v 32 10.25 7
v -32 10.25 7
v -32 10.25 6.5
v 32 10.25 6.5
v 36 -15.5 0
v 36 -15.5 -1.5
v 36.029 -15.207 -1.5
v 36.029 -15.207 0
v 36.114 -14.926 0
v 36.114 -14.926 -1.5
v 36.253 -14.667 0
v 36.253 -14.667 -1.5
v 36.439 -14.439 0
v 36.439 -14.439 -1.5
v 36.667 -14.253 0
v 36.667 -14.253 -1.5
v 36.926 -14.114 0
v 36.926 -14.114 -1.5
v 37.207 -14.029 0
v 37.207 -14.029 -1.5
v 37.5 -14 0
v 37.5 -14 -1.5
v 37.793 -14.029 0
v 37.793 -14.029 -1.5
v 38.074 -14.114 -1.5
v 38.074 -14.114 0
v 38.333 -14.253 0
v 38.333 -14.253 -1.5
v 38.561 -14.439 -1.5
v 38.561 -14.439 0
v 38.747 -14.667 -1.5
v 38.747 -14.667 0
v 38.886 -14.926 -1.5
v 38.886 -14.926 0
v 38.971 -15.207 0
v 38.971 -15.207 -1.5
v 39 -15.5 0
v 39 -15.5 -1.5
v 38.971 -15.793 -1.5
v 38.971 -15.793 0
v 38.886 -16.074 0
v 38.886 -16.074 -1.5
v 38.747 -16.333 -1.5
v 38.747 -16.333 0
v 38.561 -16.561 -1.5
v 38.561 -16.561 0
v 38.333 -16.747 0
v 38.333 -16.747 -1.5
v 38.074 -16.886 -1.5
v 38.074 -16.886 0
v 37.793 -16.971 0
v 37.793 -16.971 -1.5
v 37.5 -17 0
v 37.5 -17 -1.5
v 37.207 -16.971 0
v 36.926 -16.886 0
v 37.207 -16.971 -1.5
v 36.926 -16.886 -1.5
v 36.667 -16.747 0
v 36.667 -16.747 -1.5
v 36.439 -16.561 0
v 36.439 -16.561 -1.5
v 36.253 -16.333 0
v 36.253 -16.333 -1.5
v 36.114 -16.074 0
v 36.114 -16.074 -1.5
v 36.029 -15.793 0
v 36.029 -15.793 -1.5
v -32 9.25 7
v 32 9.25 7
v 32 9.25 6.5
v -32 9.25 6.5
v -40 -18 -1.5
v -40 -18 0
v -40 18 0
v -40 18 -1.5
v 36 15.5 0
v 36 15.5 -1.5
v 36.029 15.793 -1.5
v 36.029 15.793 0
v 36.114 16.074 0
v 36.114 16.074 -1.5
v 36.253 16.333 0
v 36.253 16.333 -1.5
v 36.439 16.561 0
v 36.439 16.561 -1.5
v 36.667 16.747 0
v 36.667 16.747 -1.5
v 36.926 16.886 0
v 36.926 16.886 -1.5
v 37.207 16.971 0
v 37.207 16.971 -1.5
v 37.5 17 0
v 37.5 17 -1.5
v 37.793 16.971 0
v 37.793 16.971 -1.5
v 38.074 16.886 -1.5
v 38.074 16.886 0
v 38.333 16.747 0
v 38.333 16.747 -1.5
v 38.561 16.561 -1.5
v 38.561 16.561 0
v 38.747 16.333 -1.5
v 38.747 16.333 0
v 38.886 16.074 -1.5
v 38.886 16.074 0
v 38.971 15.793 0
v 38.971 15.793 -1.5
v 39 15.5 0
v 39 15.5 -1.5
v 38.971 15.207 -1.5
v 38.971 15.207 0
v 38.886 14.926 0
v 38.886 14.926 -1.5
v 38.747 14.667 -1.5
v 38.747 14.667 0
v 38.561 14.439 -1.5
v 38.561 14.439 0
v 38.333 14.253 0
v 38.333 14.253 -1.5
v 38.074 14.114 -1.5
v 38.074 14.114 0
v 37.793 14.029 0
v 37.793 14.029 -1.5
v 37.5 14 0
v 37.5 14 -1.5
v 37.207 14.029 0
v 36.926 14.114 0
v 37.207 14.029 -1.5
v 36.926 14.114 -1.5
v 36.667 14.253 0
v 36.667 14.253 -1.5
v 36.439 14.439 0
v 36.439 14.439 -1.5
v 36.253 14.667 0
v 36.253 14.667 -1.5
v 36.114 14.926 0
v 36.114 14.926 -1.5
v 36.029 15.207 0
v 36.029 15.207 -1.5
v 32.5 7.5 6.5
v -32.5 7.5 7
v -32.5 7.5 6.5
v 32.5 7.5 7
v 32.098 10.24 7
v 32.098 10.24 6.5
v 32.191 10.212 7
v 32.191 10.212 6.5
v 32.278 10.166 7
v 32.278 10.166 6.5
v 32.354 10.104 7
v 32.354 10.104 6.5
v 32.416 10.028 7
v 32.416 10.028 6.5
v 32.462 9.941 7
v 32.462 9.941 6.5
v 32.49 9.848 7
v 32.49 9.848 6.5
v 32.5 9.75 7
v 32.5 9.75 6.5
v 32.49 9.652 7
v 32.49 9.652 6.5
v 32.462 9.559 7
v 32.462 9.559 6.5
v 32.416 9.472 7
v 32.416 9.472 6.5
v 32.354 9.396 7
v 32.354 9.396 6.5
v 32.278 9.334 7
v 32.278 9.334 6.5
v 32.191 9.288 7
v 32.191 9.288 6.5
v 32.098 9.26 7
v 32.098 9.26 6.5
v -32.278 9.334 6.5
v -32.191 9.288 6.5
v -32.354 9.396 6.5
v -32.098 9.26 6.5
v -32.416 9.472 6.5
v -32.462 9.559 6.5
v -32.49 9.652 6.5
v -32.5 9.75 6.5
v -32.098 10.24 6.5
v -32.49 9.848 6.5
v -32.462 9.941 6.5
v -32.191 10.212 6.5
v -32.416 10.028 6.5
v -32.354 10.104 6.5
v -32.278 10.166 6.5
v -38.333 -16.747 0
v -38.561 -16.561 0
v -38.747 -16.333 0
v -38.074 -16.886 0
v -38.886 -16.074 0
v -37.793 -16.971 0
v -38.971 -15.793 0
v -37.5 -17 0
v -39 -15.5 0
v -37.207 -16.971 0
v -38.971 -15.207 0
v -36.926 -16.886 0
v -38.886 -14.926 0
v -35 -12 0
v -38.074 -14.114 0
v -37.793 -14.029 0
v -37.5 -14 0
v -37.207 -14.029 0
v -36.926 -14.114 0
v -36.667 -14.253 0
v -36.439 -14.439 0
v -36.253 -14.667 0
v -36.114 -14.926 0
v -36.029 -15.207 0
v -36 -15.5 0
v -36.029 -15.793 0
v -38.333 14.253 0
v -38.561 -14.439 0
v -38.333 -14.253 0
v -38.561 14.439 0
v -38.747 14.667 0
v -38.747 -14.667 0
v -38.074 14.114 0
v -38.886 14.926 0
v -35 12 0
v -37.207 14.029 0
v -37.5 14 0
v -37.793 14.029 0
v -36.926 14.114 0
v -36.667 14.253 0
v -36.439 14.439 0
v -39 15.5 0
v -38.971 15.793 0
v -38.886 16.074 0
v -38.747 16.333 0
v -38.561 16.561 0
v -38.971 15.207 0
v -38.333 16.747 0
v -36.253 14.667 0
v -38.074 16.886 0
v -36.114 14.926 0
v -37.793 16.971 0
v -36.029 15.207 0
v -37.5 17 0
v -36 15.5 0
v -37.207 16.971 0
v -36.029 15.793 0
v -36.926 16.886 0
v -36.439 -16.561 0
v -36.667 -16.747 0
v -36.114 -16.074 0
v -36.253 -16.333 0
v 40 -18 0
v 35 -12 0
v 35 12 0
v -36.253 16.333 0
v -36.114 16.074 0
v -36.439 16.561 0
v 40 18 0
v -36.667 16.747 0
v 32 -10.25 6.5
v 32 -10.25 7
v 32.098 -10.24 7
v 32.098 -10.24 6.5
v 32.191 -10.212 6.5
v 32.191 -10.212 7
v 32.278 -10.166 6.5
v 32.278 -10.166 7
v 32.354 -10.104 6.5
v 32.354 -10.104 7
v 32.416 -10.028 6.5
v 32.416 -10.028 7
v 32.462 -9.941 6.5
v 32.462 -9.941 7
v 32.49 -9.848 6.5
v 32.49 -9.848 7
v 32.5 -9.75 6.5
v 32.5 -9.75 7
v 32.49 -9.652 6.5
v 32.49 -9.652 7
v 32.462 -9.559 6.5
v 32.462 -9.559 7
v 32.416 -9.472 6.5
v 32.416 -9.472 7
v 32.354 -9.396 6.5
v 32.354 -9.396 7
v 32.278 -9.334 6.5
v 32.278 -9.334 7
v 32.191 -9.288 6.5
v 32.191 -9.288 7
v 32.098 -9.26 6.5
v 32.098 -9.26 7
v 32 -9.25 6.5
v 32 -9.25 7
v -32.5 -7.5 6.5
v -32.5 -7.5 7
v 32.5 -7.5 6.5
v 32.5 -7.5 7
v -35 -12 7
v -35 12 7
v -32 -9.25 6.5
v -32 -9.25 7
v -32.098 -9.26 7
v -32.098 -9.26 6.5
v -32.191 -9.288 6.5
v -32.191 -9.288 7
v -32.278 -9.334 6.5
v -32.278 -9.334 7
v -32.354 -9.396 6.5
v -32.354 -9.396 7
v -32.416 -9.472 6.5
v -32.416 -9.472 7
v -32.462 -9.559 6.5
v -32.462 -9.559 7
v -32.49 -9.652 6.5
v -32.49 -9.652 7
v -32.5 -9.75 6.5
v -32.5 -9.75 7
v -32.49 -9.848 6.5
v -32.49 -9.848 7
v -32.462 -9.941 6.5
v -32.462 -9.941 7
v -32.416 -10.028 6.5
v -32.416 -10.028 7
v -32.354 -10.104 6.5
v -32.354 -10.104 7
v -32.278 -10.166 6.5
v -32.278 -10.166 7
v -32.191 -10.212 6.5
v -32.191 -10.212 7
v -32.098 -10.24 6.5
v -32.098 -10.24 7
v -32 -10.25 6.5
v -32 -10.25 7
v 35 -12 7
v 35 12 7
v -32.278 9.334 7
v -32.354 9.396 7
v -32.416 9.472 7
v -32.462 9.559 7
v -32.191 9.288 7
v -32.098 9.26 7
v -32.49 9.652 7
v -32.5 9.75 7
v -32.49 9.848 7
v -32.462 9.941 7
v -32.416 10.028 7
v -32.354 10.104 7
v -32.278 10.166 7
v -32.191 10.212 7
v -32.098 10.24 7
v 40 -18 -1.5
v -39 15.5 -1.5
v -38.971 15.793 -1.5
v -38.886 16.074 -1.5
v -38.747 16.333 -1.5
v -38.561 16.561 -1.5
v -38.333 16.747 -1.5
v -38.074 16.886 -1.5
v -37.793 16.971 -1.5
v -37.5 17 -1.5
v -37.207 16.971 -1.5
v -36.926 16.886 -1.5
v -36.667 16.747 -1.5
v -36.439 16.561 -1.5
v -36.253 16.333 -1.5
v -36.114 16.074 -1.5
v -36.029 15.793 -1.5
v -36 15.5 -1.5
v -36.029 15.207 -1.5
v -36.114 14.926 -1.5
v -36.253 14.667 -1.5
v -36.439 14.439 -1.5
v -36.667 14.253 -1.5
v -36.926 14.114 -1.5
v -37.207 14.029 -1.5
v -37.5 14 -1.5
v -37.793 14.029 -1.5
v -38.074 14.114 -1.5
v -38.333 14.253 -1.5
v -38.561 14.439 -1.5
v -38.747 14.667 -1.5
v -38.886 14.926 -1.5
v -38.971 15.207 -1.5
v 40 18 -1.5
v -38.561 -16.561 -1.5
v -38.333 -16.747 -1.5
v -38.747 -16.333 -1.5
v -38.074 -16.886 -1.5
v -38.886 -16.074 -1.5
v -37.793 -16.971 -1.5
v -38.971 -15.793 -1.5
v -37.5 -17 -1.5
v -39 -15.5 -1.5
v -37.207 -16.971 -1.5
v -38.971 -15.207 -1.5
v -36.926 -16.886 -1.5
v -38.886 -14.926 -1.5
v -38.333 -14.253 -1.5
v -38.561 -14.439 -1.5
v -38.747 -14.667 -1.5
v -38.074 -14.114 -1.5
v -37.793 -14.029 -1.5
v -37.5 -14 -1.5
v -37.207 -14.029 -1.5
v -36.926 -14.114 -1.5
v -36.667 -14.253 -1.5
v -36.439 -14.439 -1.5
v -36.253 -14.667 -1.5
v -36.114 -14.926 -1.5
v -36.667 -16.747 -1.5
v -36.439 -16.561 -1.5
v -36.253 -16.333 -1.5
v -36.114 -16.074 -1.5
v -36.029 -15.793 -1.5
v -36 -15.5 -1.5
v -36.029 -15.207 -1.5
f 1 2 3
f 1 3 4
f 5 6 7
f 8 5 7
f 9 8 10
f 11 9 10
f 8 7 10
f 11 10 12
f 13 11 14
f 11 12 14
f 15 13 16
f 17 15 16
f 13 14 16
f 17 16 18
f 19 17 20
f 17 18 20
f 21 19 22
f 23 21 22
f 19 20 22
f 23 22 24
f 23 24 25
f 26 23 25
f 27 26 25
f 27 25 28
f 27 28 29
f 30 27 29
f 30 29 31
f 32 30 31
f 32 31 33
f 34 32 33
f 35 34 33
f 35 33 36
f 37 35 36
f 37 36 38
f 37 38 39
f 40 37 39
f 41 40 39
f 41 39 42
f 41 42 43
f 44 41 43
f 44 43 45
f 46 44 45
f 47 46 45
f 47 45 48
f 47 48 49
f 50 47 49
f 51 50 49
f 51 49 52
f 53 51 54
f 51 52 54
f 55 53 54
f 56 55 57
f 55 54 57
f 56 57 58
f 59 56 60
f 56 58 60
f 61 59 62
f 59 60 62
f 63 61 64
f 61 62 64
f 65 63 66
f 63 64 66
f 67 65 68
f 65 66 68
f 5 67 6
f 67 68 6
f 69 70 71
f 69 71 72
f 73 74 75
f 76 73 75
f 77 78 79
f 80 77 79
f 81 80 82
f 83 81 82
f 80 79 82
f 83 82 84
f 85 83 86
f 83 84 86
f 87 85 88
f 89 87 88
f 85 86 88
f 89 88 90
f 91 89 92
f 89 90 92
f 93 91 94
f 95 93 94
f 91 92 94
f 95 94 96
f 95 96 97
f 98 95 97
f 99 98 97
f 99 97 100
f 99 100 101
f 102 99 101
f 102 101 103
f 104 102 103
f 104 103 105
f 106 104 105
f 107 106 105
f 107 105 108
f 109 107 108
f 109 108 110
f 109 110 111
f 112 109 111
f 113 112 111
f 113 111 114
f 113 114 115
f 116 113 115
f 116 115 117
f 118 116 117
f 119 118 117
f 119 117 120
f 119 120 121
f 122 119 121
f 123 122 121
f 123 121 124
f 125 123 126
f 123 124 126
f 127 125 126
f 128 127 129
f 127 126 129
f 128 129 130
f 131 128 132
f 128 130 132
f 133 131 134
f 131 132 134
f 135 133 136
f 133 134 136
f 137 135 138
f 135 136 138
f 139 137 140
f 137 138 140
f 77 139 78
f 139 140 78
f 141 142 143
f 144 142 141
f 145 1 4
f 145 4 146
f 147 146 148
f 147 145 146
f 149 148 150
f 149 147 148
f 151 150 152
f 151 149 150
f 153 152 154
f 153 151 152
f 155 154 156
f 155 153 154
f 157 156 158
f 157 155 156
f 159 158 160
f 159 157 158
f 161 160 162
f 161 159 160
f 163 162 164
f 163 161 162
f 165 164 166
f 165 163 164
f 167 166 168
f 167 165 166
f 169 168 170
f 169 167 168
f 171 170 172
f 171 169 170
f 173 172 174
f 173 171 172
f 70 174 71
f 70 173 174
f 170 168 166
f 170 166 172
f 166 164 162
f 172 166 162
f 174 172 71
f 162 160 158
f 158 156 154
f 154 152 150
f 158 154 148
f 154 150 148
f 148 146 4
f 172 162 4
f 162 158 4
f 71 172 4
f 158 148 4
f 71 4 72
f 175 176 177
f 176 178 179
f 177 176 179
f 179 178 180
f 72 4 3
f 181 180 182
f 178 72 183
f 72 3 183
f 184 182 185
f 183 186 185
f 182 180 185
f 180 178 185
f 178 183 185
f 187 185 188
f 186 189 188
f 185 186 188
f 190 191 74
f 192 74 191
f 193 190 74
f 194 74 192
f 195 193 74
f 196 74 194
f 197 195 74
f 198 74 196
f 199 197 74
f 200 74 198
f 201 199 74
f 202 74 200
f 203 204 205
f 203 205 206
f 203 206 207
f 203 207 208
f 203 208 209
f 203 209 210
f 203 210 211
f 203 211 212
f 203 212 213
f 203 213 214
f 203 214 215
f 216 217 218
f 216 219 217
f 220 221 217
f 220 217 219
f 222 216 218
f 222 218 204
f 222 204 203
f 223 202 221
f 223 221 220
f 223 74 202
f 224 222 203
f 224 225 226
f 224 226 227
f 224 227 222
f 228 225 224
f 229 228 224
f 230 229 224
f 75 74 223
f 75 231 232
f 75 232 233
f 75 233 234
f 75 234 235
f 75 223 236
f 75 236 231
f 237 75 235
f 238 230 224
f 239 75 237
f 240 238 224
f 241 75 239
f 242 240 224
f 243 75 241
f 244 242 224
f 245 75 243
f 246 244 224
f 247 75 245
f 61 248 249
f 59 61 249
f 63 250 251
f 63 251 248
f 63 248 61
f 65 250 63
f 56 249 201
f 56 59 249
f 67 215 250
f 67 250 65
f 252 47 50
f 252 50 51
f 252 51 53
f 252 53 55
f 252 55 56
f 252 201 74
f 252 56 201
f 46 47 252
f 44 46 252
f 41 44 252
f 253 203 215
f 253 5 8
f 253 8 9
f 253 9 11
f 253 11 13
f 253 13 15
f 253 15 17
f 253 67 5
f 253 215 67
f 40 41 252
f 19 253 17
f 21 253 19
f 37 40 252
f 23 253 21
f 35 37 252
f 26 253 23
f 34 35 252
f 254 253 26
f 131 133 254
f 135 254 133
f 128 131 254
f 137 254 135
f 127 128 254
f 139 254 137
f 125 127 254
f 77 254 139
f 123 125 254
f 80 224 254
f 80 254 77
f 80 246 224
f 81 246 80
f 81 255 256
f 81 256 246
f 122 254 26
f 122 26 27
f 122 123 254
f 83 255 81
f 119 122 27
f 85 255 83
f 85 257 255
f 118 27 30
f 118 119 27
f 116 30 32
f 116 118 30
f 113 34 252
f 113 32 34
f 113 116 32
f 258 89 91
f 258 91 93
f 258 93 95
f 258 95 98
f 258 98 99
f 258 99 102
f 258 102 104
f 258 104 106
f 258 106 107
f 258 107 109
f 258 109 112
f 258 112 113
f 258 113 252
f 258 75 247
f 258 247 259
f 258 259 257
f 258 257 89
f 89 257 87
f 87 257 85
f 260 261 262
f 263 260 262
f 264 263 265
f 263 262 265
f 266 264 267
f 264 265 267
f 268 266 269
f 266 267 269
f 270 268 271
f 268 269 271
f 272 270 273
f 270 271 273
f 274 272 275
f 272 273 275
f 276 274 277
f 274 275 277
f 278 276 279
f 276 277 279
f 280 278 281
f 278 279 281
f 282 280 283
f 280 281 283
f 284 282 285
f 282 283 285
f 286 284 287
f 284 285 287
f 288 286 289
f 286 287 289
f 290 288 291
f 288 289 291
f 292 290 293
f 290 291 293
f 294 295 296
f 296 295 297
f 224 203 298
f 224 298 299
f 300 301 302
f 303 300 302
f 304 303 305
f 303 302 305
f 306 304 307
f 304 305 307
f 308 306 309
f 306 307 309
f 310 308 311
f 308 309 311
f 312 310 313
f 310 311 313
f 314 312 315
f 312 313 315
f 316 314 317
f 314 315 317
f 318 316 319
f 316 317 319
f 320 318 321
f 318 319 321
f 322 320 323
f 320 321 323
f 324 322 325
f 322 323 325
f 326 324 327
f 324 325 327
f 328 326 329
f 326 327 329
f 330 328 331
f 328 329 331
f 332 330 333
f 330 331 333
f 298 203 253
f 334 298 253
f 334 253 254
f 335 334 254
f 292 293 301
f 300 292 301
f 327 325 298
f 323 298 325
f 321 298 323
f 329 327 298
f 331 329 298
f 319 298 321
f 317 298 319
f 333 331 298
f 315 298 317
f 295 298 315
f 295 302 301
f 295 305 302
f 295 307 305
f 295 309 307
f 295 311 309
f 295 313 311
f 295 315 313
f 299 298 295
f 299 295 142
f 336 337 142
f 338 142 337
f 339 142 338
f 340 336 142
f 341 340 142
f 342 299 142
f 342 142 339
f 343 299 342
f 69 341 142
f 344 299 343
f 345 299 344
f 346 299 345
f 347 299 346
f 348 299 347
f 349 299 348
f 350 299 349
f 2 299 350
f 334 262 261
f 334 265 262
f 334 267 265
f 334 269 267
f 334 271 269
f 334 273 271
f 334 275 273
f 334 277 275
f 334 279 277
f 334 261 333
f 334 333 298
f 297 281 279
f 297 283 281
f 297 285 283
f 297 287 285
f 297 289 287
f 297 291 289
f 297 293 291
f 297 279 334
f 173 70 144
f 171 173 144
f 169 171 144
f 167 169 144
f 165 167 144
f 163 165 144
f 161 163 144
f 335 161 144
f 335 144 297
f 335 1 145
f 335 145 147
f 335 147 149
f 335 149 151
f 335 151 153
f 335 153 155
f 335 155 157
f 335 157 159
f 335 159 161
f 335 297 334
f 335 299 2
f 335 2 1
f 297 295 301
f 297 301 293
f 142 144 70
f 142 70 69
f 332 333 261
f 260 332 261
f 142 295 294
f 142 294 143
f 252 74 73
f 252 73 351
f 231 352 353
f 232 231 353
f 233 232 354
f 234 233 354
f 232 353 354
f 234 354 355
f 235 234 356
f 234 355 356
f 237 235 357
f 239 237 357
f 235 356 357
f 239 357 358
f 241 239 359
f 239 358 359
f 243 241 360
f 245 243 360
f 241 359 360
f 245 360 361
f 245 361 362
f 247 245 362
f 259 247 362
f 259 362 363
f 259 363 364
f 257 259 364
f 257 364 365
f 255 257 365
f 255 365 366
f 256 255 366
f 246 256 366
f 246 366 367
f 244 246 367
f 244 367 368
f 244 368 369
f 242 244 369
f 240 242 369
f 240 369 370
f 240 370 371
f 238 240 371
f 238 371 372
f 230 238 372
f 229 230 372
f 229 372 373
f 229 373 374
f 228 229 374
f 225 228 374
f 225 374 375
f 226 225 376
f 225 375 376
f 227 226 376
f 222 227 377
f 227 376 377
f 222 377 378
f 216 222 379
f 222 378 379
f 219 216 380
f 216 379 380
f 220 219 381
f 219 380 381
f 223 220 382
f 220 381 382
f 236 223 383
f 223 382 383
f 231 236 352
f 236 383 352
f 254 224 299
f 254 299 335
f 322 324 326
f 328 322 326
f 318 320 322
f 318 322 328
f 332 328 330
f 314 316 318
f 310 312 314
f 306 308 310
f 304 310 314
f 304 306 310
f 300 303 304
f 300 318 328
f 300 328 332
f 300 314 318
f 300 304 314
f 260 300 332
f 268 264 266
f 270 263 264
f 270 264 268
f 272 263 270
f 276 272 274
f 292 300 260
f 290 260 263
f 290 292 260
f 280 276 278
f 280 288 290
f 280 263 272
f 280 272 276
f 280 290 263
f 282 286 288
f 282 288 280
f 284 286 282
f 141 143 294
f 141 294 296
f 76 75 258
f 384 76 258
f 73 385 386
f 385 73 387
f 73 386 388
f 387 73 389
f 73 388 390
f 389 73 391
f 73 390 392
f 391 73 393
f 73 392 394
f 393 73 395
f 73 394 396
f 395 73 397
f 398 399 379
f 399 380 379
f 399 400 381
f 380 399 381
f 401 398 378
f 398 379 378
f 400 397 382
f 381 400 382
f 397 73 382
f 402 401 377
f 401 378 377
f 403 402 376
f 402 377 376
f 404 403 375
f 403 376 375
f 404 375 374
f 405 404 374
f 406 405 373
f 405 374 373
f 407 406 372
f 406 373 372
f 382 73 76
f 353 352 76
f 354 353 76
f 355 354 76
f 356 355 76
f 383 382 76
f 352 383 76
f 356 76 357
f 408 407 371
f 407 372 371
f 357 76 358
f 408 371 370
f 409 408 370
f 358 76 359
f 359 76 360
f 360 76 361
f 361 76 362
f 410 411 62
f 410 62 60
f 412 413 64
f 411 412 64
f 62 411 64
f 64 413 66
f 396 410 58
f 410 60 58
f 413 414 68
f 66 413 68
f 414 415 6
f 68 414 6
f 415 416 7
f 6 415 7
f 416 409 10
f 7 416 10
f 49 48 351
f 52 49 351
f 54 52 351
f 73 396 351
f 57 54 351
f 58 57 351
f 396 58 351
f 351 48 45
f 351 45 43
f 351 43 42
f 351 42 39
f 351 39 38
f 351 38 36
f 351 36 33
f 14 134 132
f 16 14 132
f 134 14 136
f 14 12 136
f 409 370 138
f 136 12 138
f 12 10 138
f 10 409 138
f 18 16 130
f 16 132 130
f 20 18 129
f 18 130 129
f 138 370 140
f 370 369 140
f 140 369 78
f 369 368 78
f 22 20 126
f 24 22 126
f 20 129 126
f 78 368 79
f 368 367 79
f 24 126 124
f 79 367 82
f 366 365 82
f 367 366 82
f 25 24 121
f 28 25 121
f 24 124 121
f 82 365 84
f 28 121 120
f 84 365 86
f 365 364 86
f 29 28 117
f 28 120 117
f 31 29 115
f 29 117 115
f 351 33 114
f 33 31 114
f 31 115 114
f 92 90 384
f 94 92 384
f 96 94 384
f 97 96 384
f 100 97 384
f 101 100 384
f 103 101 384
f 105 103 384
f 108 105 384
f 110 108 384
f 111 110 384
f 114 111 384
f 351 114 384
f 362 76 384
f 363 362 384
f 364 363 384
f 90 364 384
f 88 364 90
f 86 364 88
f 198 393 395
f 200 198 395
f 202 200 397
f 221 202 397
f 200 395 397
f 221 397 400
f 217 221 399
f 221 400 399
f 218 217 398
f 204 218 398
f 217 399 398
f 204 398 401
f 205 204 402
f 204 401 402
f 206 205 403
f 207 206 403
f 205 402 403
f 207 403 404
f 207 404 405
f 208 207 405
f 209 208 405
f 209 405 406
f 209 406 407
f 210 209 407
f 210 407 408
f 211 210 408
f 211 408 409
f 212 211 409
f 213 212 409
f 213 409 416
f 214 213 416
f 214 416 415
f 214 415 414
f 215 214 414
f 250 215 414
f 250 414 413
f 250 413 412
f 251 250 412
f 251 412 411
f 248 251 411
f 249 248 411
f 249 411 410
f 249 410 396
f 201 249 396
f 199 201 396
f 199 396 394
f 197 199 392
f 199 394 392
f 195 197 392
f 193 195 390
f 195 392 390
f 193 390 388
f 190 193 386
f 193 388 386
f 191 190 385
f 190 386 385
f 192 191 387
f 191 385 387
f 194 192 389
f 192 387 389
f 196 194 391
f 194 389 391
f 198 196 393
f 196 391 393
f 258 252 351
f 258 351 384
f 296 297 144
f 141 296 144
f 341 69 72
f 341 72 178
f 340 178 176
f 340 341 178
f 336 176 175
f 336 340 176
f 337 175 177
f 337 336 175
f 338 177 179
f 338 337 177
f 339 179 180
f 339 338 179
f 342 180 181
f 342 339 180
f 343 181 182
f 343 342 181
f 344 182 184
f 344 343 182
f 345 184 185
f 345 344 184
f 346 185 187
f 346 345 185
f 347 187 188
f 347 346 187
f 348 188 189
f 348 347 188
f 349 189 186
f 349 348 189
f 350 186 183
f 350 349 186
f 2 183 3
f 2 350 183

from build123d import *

# Parameters (mm, degrees)
SKETCH1_W           = 80
SKETCH1_H           = 36
BASE_FLANGE1_DEPTH  = 1.5
SKETCH6_W           = 70
SKETCH6_H           = 24
BOSS_EXTRUDE1_DEPTH = 7
SKETCH7_W           = 65
SKETCH7_H           = 15
CUT_EXTRUDE1_DEPTH  = 0.5
CUT_EXTRUDE2_DEPTH  = 0.5
CUT_EXTRUDE3_REACH  = 46.679
SKETCH9_R           = 1.5


# Sheet-metal steps are written as plain solids
with BuildPart() as part:
    # Sketch1 → Base-Flange1 (new body)
    with BuildSketch(Plane.XY):
        Rectangle(SKETCH1_W, SKETCH1_H)
    extrude(amount=-BASE_FLANGE1_DEPTH)

    # Sketch6 → Boss-Extrude1 (add)
    with BuildSketch(Plane.XY):
        Rectangle(SKETCH6_W, SKETCH6_H)
    extrude(amount=BOSS_EXTRUDE1_DEPTH)

    # Sketch7 → Cut-Extrude1 (cut)
    with BuildSketch(Plane.XY.offset(7)):
        Rectangle(SKETCH7_W, SKETCH7_H)
    extrude(amount=-CUT_EXTRUDE1_DEPTH, mode=Mode.SUBTRACT)

    # Sketch8 → Cut-Extrude2 (cut)
    with BuildSketch(Plane.XY.offset(7)):
        with BuildLine():
            Line((32, 9.25), (-32, 9.25))
            ThreePointArc((-32, 9.25), (-32.5, 9.75), (-32, 10.25))
            Line((-32, 10.25), (32, 10.25))
            ThreePointArc((32, 10.25), (32.5, 9.75), (32, 9.25))
        make_face()
        with BuildLine():
            Line((32, -9.25), (-32, -9.25))
            ThreePointArc((-32, -9.25), (-32.5, -9.75), (-32, -10.25))
            Line((-32, -10.25), (32, -10.25))
            ThreePointArc((32, -10.25), (32.5, -9.75), (32, -9.25))
        make_face()
    extrude(amount=-CUT_EXTRUDE2_DEPTH, mode=Mode.SUBTRACT)

    # Sketch9 → Cut-Extrude3 (cut, up to next)
    with BuildSketch(Plane(origin=(0, 0, -1.5), x_dir=(-1, 0, 0), z_dir=(0, 0, -1)), mode=Mode.PRIVATE) as cut_extrude3_sk1:
        with Locations((-37.5, 15.5)):
            Circle(SKETCH9_R)
    cut_extrude3_tool1 = extrude(cut_extrude3_sk1.sketch, amount=-CUT_EXTRUDE3_REACH, mode=Mode.PRIVATE) & part.part
    # Sketch9 → Cut-Extrude3 (cut, up to next)
    with BuildSketch(Plane(origin=(0, 0, -1.5), x_dir=(-1, 0, 0), z_dir=(0, 0, -1)), mode=Mode.PRIVATE) as cut_extrude3_sk2:
        with Locations((-37.5, -15.5)):
            Circle(SKETCH9_R)
    cut_extrude3_tool2 = extrude(cut_extrude3_sk2.sketch, amount=-CUT_EXTRUDE3_REACH, mode=Mode.PRIVATE) & part.part
    # Sketch9 → Cut-Extrude3 (cut, up to next)
    with BuildSketch(Plane(origin=(0, 0, -1.5), x_dir=(-1, 0, 0), z_dir=(0, 0, -1)), mode=Mode.PRIVATE) as cut_extrude3_sk3:
        with Locations((37.5, 15.5)):
            Circle(SKETCH9_R)
    cut_extrude3_tool3 = extrude(cut_extrude3_sk3.sketch, amount=-CUT_EXTRUDE3_REACH, mode=Mode.PRIVATE) & part.part
    # Sketch9 → Cut-Extrude3 (cut, up to next)
    with BuildSketch(Plane(origin=(0, 0, -1.5), x_dir=(-1, 0, 0), z_dir=(0, 0, -1)), mode=Mode.PRIVATE) as cut_extrude3_sk4:
        with Locations((37.5, -15.5)):
            Circle(SKETCH9_R)
    cut_extrude3_tool4 = extrude(cut_extrude3_sk4.sketch, amount=-CUT_EXTRUDE3_REACH, mode=Mode.PRIVATE) & part.part
    add(cut_extrude3_tool1.solids().sort_by_distance((37.5, 15.5, -1.5))[0], mode=Mode.SUBTRACT)
    add(cut_extrude3_tool2.solids().sort_by_distance((37.5, -15.5, -1.5))[0], mode=Mode.SUBTRACT)
    add(cut_extrude3_tool3.solids().sort_by_distance((-37.5, 15.5, -1.5))[0], mode=Mode.SUBTRACT)
    add(cut_extrude3_tool4.solids().sort_by_distance((-37.5, -15.5, -1.5))[0], mode=Mode.SUBTRACT)


solid = part.part
